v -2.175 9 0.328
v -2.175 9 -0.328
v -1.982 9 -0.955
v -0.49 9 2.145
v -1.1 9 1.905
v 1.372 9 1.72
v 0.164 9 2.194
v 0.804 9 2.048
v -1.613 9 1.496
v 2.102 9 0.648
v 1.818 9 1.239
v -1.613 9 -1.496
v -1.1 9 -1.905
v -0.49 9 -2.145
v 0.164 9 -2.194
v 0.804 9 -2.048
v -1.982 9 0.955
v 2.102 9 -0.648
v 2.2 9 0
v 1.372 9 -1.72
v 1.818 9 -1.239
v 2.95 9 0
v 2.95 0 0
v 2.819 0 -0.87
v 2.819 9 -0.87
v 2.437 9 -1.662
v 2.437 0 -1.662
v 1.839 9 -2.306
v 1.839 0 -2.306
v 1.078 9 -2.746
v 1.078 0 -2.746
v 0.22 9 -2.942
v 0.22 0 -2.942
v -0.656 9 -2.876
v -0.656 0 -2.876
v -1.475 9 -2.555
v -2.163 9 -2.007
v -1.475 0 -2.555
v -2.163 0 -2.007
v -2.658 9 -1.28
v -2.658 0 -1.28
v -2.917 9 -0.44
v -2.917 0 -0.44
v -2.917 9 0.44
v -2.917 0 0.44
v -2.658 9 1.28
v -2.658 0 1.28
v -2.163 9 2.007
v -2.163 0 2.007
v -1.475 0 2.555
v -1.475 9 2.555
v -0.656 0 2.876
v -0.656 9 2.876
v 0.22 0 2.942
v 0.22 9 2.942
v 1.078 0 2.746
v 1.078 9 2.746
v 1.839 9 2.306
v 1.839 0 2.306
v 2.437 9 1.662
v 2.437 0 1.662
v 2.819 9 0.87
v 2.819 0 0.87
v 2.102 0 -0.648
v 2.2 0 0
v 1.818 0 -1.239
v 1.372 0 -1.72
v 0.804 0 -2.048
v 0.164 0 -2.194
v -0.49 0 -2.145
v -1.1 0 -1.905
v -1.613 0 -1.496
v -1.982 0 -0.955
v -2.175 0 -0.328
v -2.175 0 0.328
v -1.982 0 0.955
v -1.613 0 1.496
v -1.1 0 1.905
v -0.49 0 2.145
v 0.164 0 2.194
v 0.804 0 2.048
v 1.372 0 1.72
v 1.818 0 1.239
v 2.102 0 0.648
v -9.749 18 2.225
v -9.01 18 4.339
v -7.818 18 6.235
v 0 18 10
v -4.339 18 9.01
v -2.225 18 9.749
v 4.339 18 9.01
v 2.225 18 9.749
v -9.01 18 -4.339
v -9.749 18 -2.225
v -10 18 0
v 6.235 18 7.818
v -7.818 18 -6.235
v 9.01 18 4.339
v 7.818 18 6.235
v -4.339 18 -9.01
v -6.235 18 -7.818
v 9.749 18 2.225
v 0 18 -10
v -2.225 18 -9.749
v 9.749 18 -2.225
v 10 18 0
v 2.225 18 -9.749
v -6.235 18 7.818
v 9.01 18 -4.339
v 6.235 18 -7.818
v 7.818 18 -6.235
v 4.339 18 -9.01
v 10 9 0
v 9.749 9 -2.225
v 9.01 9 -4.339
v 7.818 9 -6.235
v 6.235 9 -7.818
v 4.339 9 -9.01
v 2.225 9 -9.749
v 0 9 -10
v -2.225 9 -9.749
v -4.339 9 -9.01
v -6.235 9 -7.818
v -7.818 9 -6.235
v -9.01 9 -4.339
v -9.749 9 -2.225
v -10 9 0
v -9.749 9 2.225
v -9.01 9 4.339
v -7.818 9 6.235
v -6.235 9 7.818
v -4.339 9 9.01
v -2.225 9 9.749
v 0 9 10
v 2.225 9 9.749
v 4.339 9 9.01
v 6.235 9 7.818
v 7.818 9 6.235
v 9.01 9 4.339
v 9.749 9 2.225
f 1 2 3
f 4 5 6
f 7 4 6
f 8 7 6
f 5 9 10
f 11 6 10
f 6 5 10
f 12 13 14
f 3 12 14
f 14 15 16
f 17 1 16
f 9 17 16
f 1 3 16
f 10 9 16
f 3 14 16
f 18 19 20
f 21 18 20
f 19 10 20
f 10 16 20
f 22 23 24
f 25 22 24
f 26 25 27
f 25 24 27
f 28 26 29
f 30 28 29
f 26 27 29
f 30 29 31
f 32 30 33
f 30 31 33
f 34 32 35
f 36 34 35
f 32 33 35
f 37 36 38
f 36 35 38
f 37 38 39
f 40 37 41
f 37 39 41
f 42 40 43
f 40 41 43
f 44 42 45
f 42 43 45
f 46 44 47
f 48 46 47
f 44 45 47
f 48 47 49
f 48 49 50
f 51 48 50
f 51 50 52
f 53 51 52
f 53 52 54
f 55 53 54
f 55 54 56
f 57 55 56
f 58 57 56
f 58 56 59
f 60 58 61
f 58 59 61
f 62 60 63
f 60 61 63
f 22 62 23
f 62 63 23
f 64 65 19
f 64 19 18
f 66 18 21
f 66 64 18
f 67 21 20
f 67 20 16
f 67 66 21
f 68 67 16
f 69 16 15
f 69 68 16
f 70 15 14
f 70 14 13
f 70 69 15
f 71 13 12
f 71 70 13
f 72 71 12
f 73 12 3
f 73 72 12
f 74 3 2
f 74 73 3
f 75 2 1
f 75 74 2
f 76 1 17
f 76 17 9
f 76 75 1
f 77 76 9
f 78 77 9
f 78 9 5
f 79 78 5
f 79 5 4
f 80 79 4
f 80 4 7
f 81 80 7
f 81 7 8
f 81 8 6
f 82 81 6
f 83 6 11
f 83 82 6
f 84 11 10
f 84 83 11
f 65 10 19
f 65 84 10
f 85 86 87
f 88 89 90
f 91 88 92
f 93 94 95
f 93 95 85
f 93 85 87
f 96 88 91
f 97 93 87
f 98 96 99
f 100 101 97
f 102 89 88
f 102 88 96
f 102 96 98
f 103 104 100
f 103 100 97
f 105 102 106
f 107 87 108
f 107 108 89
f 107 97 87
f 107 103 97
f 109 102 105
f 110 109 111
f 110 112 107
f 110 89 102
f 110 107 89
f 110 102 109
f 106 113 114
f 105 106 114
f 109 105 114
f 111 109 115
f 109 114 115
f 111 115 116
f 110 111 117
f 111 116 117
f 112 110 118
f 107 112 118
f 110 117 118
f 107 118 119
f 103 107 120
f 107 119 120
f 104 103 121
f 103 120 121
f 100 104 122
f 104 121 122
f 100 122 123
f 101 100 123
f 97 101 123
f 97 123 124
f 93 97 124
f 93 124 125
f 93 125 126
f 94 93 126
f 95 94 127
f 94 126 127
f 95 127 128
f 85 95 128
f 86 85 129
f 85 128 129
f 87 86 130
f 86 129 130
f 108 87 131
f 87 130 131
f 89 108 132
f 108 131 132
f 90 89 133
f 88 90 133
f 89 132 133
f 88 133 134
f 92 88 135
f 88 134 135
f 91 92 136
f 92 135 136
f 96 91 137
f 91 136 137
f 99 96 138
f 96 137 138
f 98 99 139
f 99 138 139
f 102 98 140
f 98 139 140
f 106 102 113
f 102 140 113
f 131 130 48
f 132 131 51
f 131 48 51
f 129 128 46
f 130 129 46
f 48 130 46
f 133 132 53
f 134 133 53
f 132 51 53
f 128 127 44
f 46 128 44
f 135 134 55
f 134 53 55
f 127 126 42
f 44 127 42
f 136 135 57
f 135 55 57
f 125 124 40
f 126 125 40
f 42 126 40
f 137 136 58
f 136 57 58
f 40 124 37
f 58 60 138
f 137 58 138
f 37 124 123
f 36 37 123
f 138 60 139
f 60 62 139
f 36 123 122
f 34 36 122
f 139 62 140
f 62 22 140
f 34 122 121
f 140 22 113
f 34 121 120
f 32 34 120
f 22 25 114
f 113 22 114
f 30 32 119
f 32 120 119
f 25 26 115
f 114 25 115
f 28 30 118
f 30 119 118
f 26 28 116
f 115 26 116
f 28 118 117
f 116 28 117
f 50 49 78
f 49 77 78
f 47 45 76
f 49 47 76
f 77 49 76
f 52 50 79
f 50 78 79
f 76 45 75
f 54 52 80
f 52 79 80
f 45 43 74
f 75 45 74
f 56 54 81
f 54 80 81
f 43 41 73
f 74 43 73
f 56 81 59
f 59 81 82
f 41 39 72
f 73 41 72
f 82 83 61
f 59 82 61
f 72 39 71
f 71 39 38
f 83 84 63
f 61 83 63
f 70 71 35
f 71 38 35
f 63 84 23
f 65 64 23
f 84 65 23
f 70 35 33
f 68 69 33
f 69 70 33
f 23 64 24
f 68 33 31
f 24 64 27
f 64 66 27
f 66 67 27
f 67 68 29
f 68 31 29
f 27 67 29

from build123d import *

# Parameters (mm, degrees)
SKETCH1_R           = 2.95
SKETCH1_R_2         = 2.2
BOSS_EXTRUDE1_DEPTH = 9
SKETCH2_R           = 10
BOSS_EXTRUDE2_DEPTH = 9


with BuildPart() as part:
    # Sketch1 → Boss-Extrude1 (new body)
    with BuildSketch(Plane(origin=(0, 0, 0), x_dir=(1, 0, 0), z_dir=(0, 1, 0))):
        Circle(SKETCH1_R)
        Circle(SKETCH1_R_2, mode=Mode.SUBTRACT)
    extrude(amount=BOSS_EXTRUDE1_DEPTH)

    # Sketch2 → Boss-Extrude2 (add)
    with BuildSketch(Plane(origin=(0, 9, 0), x_dir=(1, 0, 0), z_dir=(0, 1, 0))):
        Circle(SKETCH2_R)
    extrude(amount=BOSS_EXTRUDE2_DEPTH)


solid = part.part
